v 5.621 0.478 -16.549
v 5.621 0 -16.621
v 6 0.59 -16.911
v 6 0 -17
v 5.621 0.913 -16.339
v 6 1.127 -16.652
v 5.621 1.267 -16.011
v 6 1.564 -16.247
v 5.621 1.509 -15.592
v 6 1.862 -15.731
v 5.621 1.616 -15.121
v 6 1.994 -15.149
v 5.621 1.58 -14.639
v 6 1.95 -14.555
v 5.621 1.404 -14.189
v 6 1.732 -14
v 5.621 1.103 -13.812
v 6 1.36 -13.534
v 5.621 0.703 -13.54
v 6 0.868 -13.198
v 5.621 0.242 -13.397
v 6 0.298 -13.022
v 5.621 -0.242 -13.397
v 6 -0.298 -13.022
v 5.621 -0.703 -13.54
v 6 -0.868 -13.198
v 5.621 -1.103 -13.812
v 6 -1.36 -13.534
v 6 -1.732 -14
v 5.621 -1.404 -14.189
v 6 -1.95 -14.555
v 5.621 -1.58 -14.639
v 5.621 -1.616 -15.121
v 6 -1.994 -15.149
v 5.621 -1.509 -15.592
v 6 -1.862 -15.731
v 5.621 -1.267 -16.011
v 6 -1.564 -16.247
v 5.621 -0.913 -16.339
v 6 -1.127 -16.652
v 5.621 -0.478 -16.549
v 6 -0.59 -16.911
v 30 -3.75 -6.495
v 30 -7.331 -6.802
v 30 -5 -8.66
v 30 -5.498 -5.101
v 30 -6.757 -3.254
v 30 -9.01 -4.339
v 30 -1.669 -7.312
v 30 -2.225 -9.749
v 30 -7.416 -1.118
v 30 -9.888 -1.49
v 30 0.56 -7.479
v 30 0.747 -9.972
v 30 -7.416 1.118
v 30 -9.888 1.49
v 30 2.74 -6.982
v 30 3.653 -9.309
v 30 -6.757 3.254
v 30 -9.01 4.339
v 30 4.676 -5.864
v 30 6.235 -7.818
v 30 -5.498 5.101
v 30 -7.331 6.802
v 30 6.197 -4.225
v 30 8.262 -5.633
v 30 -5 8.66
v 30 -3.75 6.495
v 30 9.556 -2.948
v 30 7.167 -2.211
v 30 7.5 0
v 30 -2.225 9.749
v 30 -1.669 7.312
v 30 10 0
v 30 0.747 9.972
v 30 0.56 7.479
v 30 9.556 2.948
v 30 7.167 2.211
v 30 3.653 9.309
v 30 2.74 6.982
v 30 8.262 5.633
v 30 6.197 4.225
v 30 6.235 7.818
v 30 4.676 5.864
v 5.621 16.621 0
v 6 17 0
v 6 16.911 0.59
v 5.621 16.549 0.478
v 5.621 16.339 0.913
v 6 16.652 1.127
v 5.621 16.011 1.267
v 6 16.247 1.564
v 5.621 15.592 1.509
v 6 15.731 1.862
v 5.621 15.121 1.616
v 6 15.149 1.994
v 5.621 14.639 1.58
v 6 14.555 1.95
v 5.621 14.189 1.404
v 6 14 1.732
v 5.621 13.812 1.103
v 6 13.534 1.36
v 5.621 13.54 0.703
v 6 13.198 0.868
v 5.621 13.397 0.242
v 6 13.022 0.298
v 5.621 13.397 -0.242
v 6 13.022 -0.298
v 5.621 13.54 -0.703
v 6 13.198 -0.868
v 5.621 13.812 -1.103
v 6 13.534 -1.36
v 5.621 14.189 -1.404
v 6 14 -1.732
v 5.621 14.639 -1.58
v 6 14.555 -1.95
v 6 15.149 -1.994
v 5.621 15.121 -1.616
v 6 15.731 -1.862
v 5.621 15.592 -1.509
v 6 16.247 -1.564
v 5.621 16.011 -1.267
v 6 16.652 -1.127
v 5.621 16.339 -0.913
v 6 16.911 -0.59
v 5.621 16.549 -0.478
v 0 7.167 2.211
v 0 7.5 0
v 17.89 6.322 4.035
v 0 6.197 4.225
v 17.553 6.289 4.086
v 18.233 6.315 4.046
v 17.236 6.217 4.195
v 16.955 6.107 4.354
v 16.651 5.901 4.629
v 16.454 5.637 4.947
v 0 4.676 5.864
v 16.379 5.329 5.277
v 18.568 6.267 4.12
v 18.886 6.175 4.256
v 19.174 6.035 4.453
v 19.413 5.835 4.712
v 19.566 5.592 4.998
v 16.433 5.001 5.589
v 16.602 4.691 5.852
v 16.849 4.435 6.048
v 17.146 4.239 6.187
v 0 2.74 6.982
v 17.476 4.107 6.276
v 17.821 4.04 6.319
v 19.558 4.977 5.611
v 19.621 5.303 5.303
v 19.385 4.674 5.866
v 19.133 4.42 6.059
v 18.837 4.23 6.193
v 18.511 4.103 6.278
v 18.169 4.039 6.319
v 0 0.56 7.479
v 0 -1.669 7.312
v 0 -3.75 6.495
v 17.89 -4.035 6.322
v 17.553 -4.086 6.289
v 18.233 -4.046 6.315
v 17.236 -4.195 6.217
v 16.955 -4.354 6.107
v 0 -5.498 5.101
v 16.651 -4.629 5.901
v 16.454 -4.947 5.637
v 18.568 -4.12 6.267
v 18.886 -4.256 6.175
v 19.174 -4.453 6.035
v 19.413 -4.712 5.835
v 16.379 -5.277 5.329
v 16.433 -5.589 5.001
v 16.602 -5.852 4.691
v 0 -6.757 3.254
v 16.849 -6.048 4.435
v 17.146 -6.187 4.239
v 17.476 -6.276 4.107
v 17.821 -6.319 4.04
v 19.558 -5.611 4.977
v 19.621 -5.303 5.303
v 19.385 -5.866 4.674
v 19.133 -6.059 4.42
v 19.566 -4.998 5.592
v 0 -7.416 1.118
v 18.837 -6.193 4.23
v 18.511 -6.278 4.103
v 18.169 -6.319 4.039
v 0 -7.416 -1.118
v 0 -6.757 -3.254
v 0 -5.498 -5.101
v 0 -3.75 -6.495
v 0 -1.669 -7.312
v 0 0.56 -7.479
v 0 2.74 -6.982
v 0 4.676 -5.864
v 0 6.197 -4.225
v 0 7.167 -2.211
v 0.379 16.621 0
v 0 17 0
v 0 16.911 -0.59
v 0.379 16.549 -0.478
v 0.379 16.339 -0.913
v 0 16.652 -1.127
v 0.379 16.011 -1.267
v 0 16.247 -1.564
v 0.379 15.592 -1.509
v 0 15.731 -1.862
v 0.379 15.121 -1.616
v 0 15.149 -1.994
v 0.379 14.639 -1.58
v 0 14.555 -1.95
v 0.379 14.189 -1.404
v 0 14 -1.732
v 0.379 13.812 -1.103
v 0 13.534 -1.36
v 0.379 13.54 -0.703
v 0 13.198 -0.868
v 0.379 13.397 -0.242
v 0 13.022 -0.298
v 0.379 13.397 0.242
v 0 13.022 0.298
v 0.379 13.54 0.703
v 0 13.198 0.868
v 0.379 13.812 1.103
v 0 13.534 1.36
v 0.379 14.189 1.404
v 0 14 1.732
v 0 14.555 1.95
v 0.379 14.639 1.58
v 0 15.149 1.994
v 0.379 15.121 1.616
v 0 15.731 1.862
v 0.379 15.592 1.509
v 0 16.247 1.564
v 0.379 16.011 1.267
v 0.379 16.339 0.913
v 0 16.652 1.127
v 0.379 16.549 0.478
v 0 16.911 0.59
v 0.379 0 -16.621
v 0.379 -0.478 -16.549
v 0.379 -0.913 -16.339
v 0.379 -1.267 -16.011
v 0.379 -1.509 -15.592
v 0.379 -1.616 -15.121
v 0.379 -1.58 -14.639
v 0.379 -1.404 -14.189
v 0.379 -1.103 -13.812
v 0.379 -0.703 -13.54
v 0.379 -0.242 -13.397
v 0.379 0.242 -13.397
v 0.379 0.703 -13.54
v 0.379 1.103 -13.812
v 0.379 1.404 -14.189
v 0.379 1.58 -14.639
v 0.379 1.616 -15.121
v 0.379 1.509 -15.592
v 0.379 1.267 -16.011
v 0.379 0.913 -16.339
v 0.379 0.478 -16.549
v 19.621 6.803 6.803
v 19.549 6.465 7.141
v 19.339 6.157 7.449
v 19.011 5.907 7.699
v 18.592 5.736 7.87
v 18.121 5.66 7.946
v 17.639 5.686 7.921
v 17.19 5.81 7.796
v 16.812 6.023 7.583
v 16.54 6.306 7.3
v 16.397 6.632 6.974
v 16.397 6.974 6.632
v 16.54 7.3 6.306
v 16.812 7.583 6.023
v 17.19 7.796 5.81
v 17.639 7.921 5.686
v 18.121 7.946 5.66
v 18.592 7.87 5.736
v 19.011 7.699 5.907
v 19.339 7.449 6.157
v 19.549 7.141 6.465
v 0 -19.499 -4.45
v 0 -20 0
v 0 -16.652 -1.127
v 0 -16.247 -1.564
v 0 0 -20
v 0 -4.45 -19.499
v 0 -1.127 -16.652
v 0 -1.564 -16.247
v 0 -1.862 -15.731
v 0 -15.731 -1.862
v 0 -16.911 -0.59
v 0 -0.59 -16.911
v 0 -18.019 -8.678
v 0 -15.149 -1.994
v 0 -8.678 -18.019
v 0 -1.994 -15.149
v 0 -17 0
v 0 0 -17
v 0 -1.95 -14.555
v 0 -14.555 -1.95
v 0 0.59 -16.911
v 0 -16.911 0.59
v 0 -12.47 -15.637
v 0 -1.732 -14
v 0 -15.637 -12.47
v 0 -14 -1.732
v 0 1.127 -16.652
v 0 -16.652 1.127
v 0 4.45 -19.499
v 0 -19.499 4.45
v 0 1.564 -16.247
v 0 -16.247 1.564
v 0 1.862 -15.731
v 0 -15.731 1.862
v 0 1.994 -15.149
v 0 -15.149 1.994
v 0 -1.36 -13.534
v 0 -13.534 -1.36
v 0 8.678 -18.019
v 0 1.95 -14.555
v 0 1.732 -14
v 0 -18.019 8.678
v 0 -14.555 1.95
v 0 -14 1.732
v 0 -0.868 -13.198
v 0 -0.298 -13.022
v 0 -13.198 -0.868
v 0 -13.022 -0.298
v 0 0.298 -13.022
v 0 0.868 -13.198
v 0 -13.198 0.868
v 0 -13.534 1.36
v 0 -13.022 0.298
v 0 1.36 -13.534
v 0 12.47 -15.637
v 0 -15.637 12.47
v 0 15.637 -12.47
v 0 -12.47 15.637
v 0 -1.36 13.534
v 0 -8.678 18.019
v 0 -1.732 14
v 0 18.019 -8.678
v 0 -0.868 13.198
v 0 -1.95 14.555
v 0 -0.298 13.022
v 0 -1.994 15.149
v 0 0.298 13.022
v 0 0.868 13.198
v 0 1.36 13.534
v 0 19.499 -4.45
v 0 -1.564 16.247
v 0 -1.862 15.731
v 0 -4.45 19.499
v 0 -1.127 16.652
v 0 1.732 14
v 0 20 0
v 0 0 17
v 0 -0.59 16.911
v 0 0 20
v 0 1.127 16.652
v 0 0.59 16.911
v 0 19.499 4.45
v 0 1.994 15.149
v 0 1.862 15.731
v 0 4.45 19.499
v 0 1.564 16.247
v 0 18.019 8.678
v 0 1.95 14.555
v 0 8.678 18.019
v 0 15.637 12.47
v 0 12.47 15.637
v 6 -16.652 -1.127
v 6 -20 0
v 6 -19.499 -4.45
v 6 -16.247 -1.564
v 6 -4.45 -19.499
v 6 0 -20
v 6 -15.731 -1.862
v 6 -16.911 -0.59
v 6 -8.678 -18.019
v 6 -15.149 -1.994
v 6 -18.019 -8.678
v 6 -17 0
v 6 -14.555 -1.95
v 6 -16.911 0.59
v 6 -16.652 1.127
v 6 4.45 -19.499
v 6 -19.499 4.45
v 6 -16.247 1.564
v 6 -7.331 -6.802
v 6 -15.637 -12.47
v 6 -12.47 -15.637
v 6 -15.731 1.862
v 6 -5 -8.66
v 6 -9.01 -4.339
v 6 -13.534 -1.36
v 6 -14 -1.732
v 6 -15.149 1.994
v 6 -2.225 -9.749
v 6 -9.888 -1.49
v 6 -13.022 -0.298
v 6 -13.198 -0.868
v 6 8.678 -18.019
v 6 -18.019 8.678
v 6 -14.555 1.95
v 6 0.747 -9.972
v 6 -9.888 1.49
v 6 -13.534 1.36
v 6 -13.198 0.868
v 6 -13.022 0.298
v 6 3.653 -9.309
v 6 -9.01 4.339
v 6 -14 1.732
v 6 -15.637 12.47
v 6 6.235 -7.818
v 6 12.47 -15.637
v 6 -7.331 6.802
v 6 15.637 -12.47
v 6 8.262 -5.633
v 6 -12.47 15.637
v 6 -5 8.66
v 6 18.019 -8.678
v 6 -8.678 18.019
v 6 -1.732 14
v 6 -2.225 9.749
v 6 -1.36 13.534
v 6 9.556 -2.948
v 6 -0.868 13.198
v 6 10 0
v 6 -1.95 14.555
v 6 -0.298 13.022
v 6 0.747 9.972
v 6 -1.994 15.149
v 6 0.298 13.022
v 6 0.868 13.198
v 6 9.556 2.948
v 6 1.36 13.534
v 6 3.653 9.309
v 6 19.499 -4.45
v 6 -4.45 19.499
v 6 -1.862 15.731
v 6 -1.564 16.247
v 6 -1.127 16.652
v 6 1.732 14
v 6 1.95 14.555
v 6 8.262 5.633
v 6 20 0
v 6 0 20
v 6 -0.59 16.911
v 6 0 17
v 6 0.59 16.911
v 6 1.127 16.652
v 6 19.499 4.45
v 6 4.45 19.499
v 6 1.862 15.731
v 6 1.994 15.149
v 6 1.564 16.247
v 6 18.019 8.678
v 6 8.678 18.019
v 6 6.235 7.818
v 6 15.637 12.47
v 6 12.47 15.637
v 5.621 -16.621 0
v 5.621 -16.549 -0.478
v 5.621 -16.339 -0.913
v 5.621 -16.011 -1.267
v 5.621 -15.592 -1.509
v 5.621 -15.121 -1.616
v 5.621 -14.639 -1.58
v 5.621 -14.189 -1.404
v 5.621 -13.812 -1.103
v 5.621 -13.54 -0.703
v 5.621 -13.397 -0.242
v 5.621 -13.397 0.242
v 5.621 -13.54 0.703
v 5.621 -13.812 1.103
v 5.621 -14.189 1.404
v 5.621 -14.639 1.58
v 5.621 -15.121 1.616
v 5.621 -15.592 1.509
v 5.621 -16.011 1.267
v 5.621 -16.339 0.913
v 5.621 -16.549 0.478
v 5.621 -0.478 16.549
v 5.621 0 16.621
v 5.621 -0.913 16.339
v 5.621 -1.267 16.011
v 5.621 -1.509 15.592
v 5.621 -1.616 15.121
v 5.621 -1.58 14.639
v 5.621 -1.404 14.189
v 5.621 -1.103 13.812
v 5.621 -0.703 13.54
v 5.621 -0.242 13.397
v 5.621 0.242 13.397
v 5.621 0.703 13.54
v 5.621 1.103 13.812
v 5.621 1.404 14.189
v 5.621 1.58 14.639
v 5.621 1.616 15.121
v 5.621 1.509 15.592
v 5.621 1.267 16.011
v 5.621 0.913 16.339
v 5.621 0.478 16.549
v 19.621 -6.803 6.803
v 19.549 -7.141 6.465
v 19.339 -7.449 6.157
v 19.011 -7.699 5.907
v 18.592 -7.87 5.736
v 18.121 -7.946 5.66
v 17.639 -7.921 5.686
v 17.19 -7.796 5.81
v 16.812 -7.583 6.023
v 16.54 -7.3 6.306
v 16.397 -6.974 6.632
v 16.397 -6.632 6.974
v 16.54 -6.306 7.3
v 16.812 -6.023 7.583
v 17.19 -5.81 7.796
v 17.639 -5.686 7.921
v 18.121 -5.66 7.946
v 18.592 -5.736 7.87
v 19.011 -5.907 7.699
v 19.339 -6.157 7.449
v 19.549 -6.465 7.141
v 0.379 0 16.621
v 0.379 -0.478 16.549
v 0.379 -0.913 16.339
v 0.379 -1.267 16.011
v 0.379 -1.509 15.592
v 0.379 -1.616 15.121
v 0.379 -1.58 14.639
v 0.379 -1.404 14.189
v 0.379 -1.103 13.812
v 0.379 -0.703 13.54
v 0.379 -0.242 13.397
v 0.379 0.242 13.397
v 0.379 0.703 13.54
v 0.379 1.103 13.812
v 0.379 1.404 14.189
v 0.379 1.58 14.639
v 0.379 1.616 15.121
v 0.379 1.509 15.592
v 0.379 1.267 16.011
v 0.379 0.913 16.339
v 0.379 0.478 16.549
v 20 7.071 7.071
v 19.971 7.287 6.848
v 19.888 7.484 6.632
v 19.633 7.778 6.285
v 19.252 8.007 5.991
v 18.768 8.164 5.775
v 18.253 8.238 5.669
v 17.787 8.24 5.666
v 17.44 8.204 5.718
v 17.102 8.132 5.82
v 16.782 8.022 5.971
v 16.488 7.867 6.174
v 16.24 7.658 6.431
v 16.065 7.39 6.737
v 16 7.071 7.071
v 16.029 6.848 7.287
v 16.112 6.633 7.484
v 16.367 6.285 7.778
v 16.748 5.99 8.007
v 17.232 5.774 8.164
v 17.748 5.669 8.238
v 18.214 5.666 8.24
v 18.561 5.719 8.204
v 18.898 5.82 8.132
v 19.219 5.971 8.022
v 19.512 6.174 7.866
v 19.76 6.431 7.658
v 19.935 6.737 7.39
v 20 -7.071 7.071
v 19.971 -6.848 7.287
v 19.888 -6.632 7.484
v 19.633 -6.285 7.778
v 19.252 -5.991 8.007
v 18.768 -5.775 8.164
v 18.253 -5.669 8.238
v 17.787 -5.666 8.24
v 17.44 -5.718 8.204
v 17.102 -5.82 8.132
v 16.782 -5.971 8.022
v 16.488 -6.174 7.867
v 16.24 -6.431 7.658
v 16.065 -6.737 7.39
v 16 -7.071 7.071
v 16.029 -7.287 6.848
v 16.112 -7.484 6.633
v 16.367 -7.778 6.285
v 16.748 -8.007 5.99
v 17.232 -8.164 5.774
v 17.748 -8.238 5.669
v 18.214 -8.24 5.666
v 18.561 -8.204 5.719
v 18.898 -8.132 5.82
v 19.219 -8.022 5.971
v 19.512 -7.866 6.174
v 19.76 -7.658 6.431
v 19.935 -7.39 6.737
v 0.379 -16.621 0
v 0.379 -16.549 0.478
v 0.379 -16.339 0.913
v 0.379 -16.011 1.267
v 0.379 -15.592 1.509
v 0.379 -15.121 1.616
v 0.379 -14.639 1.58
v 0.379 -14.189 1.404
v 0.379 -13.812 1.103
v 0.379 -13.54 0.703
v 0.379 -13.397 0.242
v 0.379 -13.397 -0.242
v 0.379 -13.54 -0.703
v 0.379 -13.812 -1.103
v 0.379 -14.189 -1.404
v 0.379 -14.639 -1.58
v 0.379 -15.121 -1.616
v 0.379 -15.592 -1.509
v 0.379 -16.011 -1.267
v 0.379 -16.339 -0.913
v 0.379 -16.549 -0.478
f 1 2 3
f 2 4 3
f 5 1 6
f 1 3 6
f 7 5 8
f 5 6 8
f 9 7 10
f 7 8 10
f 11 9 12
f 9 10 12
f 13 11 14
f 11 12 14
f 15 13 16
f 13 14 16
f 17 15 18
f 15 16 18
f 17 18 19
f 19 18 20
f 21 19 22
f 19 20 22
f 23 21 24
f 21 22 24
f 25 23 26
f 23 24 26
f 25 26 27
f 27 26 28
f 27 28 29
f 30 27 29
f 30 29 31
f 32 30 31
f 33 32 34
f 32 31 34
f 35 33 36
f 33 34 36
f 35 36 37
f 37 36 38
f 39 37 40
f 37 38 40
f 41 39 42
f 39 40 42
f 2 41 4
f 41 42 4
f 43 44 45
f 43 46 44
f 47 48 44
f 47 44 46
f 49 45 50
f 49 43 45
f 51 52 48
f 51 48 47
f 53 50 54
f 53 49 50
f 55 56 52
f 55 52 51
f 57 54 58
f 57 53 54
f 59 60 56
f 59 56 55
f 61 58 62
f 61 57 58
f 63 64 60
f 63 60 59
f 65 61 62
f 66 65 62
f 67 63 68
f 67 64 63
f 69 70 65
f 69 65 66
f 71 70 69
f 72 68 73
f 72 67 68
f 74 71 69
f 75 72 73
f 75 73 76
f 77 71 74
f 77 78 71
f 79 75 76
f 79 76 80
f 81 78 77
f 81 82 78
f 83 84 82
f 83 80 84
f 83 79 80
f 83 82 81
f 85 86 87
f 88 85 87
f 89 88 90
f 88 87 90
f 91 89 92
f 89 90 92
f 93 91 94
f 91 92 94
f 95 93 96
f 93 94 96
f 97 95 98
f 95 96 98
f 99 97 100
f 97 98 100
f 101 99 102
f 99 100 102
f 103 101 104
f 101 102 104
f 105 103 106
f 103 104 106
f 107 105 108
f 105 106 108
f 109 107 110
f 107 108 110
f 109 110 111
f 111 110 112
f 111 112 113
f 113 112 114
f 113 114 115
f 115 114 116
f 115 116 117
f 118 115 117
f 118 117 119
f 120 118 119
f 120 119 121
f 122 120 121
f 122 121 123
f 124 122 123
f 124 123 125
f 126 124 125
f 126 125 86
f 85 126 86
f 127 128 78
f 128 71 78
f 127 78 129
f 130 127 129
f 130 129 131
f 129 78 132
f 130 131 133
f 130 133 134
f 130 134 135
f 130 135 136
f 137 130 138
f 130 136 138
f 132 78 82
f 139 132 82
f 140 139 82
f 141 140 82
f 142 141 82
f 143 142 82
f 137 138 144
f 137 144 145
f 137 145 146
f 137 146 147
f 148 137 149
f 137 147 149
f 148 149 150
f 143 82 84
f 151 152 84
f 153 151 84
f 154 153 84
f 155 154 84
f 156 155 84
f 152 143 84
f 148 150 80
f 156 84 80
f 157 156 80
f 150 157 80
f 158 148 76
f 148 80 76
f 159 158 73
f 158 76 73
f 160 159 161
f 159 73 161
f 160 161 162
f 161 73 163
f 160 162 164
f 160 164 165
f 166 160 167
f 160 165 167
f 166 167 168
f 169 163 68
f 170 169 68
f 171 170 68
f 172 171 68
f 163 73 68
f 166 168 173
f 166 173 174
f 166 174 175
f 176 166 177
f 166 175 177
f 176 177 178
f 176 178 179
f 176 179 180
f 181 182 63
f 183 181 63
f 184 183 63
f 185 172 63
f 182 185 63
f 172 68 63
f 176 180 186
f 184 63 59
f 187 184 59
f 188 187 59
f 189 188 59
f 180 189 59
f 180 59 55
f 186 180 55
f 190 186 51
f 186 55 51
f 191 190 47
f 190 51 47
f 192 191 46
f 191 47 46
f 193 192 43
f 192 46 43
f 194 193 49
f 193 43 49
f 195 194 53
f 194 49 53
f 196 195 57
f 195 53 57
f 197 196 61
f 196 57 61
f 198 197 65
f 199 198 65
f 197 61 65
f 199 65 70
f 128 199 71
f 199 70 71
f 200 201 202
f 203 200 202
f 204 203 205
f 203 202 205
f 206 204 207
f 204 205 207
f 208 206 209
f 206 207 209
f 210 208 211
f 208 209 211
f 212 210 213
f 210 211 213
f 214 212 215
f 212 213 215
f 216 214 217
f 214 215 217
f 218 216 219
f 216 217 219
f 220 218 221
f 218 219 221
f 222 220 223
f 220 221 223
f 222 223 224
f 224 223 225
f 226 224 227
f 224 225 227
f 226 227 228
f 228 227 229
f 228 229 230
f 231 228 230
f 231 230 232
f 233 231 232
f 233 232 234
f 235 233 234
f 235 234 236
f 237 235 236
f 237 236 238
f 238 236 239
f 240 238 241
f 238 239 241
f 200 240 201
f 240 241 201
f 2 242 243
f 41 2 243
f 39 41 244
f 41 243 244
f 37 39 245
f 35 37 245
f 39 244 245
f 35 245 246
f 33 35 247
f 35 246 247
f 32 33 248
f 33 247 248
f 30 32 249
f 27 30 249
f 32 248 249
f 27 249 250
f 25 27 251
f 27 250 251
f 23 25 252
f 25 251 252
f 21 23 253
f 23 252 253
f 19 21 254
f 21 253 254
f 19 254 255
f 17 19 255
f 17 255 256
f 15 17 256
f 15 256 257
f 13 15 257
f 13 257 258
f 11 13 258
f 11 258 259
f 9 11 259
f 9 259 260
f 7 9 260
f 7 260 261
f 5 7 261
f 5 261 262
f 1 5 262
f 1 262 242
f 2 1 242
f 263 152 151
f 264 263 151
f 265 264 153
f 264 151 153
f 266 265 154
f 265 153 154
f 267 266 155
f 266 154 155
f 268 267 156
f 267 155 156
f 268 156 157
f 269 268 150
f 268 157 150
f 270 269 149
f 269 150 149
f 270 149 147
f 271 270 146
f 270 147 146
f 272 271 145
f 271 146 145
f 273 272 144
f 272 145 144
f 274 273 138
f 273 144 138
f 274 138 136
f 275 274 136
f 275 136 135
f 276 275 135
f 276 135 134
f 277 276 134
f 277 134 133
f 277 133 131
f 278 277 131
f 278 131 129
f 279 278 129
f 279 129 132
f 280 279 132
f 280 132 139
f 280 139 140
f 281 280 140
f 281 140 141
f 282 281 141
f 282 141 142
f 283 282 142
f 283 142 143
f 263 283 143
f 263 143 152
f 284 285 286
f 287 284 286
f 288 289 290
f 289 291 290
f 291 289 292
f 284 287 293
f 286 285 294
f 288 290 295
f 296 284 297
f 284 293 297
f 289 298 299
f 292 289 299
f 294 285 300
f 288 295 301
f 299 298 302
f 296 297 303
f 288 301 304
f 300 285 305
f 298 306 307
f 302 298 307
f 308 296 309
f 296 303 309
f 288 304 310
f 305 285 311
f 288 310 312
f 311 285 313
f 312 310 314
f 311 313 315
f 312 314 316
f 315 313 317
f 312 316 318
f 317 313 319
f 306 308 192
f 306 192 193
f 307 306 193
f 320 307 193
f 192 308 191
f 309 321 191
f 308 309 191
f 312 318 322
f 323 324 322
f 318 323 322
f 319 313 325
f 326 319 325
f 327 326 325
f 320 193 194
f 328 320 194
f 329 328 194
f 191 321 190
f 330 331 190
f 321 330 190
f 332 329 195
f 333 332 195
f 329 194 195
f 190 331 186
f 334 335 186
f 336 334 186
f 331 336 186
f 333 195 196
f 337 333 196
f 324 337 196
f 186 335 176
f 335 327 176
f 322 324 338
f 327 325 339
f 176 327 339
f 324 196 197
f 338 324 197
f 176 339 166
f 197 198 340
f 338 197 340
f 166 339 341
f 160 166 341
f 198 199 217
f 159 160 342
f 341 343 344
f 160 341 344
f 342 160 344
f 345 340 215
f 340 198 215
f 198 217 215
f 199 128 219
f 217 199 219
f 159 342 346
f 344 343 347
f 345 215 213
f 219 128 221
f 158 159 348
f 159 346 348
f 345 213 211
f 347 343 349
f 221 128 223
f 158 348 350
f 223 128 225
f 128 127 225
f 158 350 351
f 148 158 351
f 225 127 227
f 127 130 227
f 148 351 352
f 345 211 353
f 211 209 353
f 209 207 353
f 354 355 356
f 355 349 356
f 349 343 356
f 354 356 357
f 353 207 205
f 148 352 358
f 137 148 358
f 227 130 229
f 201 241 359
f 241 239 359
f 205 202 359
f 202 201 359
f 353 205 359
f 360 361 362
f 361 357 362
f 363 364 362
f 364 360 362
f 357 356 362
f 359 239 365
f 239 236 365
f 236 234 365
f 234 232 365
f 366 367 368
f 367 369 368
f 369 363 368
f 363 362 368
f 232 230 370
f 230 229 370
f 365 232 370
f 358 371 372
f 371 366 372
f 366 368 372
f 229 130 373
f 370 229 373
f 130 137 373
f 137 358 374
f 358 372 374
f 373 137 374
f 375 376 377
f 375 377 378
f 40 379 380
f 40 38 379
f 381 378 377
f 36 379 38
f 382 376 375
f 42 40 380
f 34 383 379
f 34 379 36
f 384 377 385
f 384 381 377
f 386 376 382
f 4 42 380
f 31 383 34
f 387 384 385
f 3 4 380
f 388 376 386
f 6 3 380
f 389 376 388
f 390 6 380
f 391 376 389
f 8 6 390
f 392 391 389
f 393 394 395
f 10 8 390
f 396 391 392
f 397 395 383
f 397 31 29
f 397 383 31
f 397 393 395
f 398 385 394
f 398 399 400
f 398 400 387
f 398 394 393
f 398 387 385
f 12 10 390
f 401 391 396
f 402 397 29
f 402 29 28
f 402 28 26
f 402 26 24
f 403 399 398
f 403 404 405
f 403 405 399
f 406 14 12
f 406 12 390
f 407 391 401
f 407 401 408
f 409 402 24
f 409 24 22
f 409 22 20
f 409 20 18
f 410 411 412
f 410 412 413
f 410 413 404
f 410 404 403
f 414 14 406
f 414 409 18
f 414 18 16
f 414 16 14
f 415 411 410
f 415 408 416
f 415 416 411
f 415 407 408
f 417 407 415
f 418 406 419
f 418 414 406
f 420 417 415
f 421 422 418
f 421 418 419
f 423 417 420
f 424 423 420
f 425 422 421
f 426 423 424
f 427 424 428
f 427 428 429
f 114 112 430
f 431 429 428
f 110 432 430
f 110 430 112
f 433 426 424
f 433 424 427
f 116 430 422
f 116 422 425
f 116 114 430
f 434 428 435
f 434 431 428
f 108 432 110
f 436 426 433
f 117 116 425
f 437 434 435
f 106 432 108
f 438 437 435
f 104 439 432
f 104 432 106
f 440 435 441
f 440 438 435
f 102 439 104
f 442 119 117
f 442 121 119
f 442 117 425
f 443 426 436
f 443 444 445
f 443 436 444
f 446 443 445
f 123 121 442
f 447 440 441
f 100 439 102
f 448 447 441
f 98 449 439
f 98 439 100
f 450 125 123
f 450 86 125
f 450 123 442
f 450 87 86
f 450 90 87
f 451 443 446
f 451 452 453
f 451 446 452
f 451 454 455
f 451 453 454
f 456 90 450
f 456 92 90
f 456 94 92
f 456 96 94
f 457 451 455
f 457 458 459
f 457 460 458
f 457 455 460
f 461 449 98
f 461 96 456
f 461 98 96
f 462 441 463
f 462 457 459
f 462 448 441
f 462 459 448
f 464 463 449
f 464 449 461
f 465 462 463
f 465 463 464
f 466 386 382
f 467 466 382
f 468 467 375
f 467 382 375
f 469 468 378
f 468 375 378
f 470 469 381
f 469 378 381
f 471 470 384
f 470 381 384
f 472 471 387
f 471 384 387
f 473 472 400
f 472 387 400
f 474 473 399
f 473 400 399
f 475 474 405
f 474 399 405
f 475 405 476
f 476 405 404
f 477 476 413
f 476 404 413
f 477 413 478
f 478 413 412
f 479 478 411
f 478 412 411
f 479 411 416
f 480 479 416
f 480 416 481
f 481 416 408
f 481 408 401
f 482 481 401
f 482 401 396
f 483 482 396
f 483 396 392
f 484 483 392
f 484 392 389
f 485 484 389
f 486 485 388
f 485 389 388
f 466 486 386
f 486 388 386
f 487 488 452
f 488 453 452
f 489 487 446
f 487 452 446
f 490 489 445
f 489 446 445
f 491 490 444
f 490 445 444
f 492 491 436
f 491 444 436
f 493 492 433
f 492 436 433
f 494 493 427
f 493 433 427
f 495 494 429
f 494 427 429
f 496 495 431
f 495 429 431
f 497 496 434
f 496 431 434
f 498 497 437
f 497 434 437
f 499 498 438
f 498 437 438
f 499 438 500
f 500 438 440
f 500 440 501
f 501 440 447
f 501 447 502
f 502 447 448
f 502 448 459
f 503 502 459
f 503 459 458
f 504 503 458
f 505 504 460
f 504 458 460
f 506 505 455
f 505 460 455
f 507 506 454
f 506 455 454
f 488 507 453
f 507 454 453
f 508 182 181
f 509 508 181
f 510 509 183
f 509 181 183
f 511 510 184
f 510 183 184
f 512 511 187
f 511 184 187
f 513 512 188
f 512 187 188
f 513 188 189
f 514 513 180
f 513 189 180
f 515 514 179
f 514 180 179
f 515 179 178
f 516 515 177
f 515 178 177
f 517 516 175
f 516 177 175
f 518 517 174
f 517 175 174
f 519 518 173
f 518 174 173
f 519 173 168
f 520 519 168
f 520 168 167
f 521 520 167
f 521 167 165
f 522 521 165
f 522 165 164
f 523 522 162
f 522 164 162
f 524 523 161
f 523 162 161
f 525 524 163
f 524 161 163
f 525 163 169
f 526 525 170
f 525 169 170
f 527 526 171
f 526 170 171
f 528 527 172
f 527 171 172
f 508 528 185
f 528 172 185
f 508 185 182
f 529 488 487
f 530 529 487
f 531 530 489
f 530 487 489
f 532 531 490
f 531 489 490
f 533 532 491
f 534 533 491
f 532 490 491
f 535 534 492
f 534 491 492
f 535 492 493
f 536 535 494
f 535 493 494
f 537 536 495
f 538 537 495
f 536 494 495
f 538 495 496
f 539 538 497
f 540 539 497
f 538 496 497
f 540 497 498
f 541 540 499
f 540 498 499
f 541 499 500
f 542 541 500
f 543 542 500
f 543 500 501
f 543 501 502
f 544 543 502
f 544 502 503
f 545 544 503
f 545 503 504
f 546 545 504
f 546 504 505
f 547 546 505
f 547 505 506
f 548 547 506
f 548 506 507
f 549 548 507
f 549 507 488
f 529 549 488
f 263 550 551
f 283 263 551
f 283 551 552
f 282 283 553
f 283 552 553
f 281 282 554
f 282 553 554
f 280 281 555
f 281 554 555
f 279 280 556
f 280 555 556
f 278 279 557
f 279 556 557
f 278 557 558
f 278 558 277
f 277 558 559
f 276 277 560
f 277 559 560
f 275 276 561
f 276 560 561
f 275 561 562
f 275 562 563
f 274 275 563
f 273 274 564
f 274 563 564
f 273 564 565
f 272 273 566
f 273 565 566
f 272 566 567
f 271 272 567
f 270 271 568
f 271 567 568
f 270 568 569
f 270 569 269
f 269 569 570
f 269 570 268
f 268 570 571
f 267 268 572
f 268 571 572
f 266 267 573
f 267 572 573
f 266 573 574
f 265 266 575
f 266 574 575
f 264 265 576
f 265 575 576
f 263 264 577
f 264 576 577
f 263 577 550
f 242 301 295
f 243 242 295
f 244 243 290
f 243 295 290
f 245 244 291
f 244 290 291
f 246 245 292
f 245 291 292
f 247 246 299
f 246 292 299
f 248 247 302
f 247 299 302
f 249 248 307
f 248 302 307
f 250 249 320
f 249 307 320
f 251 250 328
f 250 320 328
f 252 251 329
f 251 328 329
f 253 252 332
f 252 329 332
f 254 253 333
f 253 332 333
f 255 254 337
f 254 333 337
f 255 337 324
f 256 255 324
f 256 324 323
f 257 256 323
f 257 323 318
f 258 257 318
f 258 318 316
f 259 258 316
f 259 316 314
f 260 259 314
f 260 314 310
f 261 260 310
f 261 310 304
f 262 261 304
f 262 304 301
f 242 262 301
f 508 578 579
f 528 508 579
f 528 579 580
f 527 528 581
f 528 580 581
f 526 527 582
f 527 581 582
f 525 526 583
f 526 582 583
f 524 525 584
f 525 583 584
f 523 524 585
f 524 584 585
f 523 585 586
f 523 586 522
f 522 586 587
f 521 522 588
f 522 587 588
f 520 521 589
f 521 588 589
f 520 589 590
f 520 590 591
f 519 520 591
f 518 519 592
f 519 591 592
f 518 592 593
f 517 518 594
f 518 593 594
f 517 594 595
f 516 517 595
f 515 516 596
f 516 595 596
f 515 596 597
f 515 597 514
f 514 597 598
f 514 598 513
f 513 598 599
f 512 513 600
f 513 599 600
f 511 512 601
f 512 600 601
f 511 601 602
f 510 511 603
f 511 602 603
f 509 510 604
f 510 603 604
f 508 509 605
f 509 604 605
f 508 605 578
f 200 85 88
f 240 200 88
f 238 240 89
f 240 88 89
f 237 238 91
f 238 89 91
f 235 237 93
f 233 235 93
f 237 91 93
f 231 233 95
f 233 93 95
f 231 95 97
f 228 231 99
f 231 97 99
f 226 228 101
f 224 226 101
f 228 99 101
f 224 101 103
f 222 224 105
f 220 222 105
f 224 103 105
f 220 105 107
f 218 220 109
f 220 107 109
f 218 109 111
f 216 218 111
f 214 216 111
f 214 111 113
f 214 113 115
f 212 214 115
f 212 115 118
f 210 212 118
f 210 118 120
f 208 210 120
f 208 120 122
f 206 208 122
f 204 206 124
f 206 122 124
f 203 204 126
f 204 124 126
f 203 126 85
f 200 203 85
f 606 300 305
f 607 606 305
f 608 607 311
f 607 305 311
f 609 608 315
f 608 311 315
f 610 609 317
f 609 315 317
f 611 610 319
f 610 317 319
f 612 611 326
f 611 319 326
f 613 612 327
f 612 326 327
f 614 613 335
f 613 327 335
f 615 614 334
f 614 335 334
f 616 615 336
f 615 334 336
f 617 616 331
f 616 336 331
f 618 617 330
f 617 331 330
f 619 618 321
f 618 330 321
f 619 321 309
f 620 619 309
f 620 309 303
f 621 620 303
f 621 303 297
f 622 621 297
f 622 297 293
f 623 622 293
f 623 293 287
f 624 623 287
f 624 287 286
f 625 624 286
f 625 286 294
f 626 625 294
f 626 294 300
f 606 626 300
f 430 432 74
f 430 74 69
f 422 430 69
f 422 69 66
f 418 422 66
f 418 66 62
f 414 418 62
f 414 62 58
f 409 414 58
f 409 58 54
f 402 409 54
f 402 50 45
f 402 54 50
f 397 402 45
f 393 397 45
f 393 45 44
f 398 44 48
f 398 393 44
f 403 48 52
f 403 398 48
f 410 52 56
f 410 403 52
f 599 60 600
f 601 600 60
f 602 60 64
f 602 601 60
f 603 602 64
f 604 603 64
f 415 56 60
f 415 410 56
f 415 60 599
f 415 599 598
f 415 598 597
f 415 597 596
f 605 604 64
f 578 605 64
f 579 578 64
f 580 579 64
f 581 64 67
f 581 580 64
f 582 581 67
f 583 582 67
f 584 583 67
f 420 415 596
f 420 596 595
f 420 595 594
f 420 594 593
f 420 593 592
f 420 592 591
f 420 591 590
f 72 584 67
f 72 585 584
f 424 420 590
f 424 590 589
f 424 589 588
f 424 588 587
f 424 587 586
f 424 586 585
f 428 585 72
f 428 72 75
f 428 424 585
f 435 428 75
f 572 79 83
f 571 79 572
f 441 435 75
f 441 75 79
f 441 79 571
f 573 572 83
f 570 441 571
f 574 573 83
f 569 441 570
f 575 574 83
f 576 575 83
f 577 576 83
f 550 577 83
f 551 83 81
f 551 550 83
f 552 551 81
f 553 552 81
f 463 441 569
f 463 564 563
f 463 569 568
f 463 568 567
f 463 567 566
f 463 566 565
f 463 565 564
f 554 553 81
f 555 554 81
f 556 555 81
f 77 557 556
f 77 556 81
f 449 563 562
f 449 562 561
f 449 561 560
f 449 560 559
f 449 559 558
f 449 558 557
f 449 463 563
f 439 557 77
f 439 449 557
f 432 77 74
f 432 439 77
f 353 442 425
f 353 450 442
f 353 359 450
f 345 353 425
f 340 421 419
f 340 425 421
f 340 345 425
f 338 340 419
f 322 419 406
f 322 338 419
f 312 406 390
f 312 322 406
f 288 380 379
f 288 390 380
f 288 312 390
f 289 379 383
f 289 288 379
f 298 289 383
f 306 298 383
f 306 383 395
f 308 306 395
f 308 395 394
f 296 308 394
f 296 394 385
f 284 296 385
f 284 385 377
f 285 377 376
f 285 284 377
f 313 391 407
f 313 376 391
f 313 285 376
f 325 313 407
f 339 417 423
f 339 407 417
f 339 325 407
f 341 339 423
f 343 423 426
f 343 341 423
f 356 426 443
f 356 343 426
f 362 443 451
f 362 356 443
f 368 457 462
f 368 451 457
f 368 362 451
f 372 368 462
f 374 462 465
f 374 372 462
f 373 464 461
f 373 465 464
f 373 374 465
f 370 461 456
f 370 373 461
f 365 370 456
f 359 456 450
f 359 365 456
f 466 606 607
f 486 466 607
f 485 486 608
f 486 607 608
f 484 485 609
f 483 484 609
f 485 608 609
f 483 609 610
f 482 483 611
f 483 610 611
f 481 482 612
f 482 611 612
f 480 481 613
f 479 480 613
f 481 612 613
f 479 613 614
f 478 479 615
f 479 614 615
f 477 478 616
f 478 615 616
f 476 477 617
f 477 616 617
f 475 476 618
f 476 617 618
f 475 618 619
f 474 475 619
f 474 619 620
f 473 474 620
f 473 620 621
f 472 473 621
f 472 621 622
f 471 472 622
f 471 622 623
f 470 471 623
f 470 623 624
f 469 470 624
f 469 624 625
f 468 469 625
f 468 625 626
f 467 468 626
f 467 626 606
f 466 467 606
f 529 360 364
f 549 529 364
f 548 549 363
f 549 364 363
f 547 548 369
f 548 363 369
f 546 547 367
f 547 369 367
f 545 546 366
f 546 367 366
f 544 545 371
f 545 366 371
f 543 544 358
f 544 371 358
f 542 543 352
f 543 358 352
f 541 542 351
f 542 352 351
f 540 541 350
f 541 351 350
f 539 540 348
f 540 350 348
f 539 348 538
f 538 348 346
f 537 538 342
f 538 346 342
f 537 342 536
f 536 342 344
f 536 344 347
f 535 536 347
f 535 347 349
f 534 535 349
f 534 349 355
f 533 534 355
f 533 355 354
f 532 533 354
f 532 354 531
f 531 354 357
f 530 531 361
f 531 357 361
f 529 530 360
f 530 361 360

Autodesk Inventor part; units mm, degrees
ref_plane "YZ Plane" through (0, 0, 0) normal (1, 0, 0) x (0, 1, 0)
ref_plane "XZ Plane" through (0, 0, 0) normal (0, 1, 0) x (-1, 0, 0)
ref_plane "XY Plane" through (0, 0, 0) normal (0, 0, 1) x (1, 0, 0)
sketch "Sketch_1" plane through (0, 0, 0) normal (0, 0, 1) x (1, 0, 0)
  line L0 (30, 0) -> (0, 0)
  line L1 (0, 20) -> (0, 7.5)
  line L2 (0, 7.5) -> (30, 7.5)
  line L3 (30, 7.5) -> (30, 10)
  line L4 (30, 10) -> (6, 10)
  line L5 (6, 10) -> (6, 20)
  line L6 (6, 20) -> (0, 20)
revolve "Revolution1" add sketch "Sketch_1" angle 360 about axis through (30, 0, 0) along (1, 0, 0)
sketch "Sketch_3" plane through (0, 0, 0) normal (0, -0.7071, 0.7071) x (1, 0, 0)
  line L0 (18, 7) -> (18, 10)
  line L1 (18, 10) -> (20, 10)
  line L2 (20, 10) -> (19.621, 9.621)
  line L3 (19.621, 9.621) -> (19.621, 7)
  line L4 (19.621, 7) -> (18, 7)
  line L5 (18, 7) -> (18, 10)
revolve "Revolution2" cut sketch "Sketch_3" angle 360 about axis through (18, 4.9497, 4.9497) along (0, -0.7071, -0.7071)
thread "Thread1" size "M4x0.7" class "6H" standard "ISO Metric profile" length 2.621
sketch "Sketch_2" plane through (0, 0, 0) normal (0, -0.7071, -0.7071) x (1, 0, 0)
  line L0 (18, 7) -> (18, 10)
  line L1 (18, 10) -> (20, 10)
  line L2 (20, 10) -> (19.621, 9.621)
  line L3 (19.621, 9.621) -> (19.621, 7)
  line L4 (19.621, 7) -> (18, 7)
  line L5 (18, 7) -> (18, 10)
revolve "Revolution3" cut sketch "Sketch_2" angle 360 about axis through (18, -4.9497, 4.9497) along (0, 0.7071, -0.7071)
thread "Thread2" size "M4x0.7" class "6H" standard "ISO Metric profile" length 2.621
sketch "Sketch_4" plane through (0, 0, 0) normal (0, 0, 1) x (1, 0, 0)
  line L0 (6, 15) -> (0, 15)
  line L1 (0, 15) -> (0, 17)
  line L2 (0, 17) -> (0.379, 16.621)
  line L3 (0.379, 16.621) -> (5.621, 16.621)
  line L4 (5.621, 16.621) -> (6, 17)
  line L5 (6, 17) -> (6, 15)
  line L6 (6, 15) -> (0, 15)
revolve "Revolution4" cut sketch "Sketch_4" angle 360 about axis through (6, 15, 0) along (1, 0, 0)
thread "Thread3" size "M4x0.7" class "6H" standard "ISO Metric profile" full length
sketch "Sketch_9" plane through (0, 0, 0) normal (0, -1, 0) x (1, 0, 0)
  line L0 (0, -15) -> (6, -15)
  line L1 (6, -15) -> (6, -17)
  line L2 (6, -17) -> (5.621, -16.621)
  line L3 (5.621, -16.621) -> (0.379, -16.621)
  line L4 (0.379, -16.621) -> (0, -17)
  line L5 (0, -17) -> (0, -15)
  line L6 (0, -15) -> (6, -15)
revolve "Revolution5" cut sketch "Sketch_9" angle 360 about axis through (0, 0, -15) along (-1, 0, 0)
thread "Thread4" size "M4x0.7" class "6H" standard "ISO Metric profile" full length
sketch "Sketch_10" plane through (0, 0, 0) normal (0, 0, 1) x (1, 0, 0)
  line L0 (0, -15) -> (6, -15)
  line L1 (6, -15) -> (6, -17)
  line L2 (6, -17) -> (5.621, -16.621)
  line L3 (5.621, -16.621) -> (0.379, -16.621)
  line L4 (0.379, -16.621) -> (0, -17)
  line L5 (0, -17) -> (0, -15)
  line L6 (0, -15) -> (6, -15)
revolve "Revolution6" cut sketch "Sketch_10" angle 360 about axis through (0, -15, 0) along (-1, 0, 0)
thread "Thread5" size "M4x0.7" class "6H" standard "ISO Metric profile" full length
sketch "Sketch_11" plane through (0, 0, 0) normal (0, -1, 0) x (1, 0, 0)
  line L0 (6, 15) -> (0, 15)
  line L1 (0, 15) -> (0, 17)
  line L2 (0, 17) -> (0.379, 16.621)
  line L3 (0.379, 16.621) -> (5.621, 16.621)
  line L4 (5.621, 16.621) -> (6, 17)
  line L5 (6, 17) -> (6, 15)
  line L6 (6, 15) -> (0, 15)
revolve "Revolution7" cut sketch "Sketch_11" angle 360 about axis through (6, 0, 15) along (1, 0, 0)
thread "Thread6" size "M4x0.7" class "6H" standard "ISO Metric profile" full length
properties part number "STHRBT15_b" material "ステンレス鋼"
